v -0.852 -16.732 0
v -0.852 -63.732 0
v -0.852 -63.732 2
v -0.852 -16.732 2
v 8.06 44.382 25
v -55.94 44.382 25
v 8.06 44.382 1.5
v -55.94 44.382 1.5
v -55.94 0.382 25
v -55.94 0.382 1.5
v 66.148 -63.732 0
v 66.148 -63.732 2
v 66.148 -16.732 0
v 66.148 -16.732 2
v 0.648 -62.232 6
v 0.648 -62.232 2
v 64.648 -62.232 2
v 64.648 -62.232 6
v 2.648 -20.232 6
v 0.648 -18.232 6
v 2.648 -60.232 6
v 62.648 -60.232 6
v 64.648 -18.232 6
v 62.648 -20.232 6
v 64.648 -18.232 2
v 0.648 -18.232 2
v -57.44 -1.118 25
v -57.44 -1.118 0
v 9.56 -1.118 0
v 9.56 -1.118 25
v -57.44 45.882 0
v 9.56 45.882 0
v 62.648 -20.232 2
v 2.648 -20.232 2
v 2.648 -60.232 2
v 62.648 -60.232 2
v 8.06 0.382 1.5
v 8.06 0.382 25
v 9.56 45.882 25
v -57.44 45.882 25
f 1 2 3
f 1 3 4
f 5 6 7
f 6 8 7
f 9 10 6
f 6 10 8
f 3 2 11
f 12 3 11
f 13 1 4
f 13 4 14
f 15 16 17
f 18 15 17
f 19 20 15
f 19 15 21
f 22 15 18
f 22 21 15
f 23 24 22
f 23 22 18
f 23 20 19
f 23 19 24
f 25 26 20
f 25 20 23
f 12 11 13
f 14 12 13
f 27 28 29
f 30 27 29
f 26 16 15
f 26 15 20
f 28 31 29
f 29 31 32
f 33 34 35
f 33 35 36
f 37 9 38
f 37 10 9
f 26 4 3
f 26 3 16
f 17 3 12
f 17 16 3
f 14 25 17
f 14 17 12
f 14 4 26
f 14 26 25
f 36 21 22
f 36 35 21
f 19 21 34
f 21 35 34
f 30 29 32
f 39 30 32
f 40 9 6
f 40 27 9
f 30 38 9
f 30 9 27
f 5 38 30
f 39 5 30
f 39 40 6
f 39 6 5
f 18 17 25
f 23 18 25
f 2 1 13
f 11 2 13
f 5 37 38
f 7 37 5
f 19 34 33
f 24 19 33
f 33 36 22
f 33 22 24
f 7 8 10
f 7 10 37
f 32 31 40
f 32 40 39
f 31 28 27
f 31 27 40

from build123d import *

# Parameters (mm, degrees)
F0_W        = 67
F0_H        = 47
F1_DEPTH    = 25
F2_T        = -1.5
F3_W        = 64
F3_H        = 44
F3_W_2      = 60
F3_H_2      = 40
F4_DEPTH    = 4
F3_W_3      = 67
F3_H_3      = 47
F4_FACE_W   = 64
F4_FACE_H   = 44
F4_FACE_W_2 = 60
F4_FACE_H_2 = 40
F5_DEPTH    = 2


with BuildPart() as f1:
    # F0 (on Top) → F1 (new body)
    with BuildSketch(Plane.XY):
        with Locations((-23.9398897778, 22.3815400898)):
            Rectangle(F0_W, F0_H)
    extrude(amount=F1_DEPTH)

    # F2
    f2_openings = [f1.faces().sort_by_distance(p)[0] for p in [
        (-23.93989, 22.38154, 25),
    ]]
    offset(amount=F2_T, openings=f2_openings)


with BuildPart() as f4:
    # F3 (on Top) → F4 (new body)
    with BuildSketch(Plane.XY):
        with Locations((32.6481368393, -40.2324752252)):
            Rectangle(F3_W, F3_H)
        with Locations((32.6481368393, -40.2324752252)):
            Rectangle(F3_W_2, F3_H_2, mode=Mode.SUBTRACT)
    extrude(amount=F4_DEPTH)

    # F3 (on Top) + F4_face (on face) → F5 (join)
    with BuildSketch(Plane.XY):
        with Locations((32.6481368393, -40.2324752252)):
            Rectangle(F3_W_3, F3_H_3)
        with Locations((32.6481368393, -40.2324752252)):
            Rectangle(F3_W, F3_H, mode=Mode.SUBTRACT)
        with Locations((32.6481368393, -40.2324752252)):
            Rectangle(F3_W, F3_H)
        with Locations((32.6481368393, -40.2324752252)):
            Rectangle(F3_W_2, F3_H_2, mode=Mode.SUBTRACT)
        with Locations((32.6481368393, -40.2324752252)):
            Rectangle(F3_W_2, F3_H_2)
    with BuildSketch(Plane(origin=(32.6481368393, -40.2324752252, 4), x_dir=(1, 0, 0), z_dir=(0, 0, 1))):
        Rectangle(F4_FACE_W, F4_FACE_H)
        Rectangle(F4_FACE_W_2, F4_FACE_H_2, mode=Mode.SUBTRACT)
    extrude(amount=F5_DEPTH)


solid = Compound([f1.part, f4.part])
